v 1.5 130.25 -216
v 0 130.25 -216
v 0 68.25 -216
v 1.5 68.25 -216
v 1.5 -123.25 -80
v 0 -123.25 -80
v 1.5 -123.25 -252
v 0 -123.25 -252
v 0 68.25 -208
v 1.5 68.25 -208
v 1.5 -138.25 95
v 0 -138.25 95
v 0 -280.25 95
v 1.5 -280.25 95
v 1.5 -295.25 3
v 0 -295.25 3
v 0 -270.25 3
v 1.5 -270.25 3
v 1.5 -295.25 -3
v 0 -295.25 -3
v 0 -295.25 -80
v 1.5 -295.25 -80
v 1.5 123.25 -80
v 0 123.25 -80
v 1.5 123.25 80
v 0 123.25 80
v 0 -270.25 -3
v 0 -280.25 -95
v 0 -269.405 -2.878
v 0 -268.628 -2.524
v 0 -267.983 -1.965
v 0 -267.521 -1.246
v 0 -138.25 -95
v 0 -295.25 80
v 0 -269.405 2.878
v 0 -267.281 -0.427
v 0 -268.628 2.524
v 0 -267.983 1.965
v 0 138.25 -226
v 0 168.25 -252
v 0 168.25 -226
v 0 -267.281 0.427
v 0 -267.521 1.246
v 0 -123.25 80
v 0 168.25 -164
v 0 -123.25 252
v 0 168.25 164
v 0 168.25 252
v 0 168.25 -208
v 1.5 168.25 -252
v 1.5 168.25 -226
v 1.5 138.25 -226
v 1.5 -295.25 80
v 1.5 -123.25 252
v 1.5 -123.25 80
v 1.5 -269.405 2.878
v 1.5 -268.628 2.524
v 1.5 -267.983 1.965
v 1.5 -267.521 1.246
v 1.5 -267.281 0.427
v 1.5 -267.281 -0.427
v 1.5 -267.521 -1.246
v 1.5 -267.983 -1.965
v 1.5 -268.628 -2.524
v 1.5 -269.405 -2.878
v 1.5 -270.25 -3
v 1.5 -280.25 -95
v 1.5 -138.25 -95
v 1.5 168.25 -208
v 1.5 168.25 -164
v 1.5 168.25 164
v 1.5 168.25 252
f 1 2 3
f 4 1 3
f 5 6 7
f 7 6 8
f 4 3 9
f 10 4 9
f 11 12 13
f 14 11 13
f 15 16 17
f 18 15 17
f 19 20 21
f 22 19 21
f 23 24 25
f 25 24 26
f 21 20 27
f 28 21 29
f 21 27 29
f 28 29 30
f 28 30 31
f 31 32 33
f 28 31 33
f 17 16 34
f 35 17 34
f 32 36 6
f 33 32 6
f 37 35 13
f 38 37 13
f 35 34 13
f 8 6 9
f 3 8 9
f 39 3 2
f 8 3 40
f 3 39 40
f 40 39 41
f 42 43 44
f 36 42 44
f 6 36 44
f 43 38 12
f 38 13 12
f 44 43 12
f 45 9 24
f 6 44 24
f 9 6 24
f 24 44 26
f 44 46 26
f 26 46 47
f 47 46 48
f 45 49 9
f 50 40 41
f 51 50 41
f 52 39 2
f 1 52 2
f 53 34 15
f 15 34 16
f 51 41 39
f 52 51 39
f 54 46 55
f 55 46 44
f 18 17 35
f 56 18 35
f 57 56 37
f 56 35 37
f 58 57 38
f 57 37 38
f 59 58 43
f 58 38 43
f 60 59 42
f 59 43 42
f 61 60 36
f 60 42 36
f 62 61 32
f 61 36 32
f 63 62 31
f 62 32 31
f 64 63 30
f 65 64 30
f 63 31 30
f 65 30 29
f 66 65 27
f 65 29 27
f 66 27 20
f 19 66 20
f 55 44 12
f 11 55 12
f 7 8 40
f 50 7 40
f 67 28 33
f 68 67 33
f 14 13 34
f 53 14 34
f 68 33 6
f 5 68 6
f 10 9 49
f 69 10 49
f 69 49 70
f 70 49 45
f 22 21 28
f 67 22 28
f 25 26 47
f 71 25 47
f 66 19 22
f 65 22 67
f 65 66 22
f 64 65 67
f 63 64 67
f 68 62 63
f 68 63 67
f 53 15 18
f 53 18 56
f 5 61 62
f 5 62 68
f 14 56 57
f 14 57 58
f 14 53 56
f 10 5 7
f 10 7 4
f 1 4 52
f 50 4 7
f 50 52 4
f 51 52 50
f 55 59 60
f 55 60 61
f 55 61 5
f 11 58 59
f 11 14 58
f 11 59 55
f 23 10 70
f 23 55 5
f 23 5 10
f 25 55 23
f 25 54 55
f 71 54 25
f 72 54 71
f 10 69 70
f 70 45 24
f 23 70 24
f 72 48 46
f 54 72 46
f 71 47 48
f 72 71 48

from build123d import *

# Parameters (mm, degrees)
F0_W     = 246.5
F0_H     = 160
F1_DEPTH = 1.5


with BuildPart() as f1:
    # F0 (on Right) → F1 (new body)
    with BuildSketch(Plane.YZ):
        with BuildLine():
            Line((-295.25, -80), (-123.25, -80))
            Line((-123.25, -80), (-123.25, 80))
            Line((-123.25, 80), (-123.695542, 80))
            Line((-123.695542, 80), (-295.25, 80))
            Line((-295.25, 80), (-295.25, 3))
            Line((-295.25, 3), (-270.25, 3))
            ThreePointArc((-270.25, 3), (-267.25, 0), (-270.25, -3))
            Line((-270.25, -3), (-295.25, -3))
            Line((-295.25, -3), (-295.25, -80))
        make_face()
        Polygon((-123.695542, 80), (-123.25, 80), (-138.25, 95), (-280.25, 95), (-295.25, 80), align=None)
        Polygon((-138.25, -95), (-123.25, -80), (-295.25, -80), (-280.25, -95), align=None)
        Rectangle(F0_W, F0_H)
        Polygon((-123.25, 80), (123.25, 80), (168.25, 164), (168.25, 252), (-123.25, 252), align=None)
        Polygon((168.25, -164), (123.25, -80), (-123.25, -80), (-123.25, -252), (168.25, -252), (168.25, -226), (138.25, -226), (130.25, -216), (68.25, -216), (68.25, -208), (168.25, -208), align=None)
    extrude(amount=F1_DEPTH)


solid = f1.part
